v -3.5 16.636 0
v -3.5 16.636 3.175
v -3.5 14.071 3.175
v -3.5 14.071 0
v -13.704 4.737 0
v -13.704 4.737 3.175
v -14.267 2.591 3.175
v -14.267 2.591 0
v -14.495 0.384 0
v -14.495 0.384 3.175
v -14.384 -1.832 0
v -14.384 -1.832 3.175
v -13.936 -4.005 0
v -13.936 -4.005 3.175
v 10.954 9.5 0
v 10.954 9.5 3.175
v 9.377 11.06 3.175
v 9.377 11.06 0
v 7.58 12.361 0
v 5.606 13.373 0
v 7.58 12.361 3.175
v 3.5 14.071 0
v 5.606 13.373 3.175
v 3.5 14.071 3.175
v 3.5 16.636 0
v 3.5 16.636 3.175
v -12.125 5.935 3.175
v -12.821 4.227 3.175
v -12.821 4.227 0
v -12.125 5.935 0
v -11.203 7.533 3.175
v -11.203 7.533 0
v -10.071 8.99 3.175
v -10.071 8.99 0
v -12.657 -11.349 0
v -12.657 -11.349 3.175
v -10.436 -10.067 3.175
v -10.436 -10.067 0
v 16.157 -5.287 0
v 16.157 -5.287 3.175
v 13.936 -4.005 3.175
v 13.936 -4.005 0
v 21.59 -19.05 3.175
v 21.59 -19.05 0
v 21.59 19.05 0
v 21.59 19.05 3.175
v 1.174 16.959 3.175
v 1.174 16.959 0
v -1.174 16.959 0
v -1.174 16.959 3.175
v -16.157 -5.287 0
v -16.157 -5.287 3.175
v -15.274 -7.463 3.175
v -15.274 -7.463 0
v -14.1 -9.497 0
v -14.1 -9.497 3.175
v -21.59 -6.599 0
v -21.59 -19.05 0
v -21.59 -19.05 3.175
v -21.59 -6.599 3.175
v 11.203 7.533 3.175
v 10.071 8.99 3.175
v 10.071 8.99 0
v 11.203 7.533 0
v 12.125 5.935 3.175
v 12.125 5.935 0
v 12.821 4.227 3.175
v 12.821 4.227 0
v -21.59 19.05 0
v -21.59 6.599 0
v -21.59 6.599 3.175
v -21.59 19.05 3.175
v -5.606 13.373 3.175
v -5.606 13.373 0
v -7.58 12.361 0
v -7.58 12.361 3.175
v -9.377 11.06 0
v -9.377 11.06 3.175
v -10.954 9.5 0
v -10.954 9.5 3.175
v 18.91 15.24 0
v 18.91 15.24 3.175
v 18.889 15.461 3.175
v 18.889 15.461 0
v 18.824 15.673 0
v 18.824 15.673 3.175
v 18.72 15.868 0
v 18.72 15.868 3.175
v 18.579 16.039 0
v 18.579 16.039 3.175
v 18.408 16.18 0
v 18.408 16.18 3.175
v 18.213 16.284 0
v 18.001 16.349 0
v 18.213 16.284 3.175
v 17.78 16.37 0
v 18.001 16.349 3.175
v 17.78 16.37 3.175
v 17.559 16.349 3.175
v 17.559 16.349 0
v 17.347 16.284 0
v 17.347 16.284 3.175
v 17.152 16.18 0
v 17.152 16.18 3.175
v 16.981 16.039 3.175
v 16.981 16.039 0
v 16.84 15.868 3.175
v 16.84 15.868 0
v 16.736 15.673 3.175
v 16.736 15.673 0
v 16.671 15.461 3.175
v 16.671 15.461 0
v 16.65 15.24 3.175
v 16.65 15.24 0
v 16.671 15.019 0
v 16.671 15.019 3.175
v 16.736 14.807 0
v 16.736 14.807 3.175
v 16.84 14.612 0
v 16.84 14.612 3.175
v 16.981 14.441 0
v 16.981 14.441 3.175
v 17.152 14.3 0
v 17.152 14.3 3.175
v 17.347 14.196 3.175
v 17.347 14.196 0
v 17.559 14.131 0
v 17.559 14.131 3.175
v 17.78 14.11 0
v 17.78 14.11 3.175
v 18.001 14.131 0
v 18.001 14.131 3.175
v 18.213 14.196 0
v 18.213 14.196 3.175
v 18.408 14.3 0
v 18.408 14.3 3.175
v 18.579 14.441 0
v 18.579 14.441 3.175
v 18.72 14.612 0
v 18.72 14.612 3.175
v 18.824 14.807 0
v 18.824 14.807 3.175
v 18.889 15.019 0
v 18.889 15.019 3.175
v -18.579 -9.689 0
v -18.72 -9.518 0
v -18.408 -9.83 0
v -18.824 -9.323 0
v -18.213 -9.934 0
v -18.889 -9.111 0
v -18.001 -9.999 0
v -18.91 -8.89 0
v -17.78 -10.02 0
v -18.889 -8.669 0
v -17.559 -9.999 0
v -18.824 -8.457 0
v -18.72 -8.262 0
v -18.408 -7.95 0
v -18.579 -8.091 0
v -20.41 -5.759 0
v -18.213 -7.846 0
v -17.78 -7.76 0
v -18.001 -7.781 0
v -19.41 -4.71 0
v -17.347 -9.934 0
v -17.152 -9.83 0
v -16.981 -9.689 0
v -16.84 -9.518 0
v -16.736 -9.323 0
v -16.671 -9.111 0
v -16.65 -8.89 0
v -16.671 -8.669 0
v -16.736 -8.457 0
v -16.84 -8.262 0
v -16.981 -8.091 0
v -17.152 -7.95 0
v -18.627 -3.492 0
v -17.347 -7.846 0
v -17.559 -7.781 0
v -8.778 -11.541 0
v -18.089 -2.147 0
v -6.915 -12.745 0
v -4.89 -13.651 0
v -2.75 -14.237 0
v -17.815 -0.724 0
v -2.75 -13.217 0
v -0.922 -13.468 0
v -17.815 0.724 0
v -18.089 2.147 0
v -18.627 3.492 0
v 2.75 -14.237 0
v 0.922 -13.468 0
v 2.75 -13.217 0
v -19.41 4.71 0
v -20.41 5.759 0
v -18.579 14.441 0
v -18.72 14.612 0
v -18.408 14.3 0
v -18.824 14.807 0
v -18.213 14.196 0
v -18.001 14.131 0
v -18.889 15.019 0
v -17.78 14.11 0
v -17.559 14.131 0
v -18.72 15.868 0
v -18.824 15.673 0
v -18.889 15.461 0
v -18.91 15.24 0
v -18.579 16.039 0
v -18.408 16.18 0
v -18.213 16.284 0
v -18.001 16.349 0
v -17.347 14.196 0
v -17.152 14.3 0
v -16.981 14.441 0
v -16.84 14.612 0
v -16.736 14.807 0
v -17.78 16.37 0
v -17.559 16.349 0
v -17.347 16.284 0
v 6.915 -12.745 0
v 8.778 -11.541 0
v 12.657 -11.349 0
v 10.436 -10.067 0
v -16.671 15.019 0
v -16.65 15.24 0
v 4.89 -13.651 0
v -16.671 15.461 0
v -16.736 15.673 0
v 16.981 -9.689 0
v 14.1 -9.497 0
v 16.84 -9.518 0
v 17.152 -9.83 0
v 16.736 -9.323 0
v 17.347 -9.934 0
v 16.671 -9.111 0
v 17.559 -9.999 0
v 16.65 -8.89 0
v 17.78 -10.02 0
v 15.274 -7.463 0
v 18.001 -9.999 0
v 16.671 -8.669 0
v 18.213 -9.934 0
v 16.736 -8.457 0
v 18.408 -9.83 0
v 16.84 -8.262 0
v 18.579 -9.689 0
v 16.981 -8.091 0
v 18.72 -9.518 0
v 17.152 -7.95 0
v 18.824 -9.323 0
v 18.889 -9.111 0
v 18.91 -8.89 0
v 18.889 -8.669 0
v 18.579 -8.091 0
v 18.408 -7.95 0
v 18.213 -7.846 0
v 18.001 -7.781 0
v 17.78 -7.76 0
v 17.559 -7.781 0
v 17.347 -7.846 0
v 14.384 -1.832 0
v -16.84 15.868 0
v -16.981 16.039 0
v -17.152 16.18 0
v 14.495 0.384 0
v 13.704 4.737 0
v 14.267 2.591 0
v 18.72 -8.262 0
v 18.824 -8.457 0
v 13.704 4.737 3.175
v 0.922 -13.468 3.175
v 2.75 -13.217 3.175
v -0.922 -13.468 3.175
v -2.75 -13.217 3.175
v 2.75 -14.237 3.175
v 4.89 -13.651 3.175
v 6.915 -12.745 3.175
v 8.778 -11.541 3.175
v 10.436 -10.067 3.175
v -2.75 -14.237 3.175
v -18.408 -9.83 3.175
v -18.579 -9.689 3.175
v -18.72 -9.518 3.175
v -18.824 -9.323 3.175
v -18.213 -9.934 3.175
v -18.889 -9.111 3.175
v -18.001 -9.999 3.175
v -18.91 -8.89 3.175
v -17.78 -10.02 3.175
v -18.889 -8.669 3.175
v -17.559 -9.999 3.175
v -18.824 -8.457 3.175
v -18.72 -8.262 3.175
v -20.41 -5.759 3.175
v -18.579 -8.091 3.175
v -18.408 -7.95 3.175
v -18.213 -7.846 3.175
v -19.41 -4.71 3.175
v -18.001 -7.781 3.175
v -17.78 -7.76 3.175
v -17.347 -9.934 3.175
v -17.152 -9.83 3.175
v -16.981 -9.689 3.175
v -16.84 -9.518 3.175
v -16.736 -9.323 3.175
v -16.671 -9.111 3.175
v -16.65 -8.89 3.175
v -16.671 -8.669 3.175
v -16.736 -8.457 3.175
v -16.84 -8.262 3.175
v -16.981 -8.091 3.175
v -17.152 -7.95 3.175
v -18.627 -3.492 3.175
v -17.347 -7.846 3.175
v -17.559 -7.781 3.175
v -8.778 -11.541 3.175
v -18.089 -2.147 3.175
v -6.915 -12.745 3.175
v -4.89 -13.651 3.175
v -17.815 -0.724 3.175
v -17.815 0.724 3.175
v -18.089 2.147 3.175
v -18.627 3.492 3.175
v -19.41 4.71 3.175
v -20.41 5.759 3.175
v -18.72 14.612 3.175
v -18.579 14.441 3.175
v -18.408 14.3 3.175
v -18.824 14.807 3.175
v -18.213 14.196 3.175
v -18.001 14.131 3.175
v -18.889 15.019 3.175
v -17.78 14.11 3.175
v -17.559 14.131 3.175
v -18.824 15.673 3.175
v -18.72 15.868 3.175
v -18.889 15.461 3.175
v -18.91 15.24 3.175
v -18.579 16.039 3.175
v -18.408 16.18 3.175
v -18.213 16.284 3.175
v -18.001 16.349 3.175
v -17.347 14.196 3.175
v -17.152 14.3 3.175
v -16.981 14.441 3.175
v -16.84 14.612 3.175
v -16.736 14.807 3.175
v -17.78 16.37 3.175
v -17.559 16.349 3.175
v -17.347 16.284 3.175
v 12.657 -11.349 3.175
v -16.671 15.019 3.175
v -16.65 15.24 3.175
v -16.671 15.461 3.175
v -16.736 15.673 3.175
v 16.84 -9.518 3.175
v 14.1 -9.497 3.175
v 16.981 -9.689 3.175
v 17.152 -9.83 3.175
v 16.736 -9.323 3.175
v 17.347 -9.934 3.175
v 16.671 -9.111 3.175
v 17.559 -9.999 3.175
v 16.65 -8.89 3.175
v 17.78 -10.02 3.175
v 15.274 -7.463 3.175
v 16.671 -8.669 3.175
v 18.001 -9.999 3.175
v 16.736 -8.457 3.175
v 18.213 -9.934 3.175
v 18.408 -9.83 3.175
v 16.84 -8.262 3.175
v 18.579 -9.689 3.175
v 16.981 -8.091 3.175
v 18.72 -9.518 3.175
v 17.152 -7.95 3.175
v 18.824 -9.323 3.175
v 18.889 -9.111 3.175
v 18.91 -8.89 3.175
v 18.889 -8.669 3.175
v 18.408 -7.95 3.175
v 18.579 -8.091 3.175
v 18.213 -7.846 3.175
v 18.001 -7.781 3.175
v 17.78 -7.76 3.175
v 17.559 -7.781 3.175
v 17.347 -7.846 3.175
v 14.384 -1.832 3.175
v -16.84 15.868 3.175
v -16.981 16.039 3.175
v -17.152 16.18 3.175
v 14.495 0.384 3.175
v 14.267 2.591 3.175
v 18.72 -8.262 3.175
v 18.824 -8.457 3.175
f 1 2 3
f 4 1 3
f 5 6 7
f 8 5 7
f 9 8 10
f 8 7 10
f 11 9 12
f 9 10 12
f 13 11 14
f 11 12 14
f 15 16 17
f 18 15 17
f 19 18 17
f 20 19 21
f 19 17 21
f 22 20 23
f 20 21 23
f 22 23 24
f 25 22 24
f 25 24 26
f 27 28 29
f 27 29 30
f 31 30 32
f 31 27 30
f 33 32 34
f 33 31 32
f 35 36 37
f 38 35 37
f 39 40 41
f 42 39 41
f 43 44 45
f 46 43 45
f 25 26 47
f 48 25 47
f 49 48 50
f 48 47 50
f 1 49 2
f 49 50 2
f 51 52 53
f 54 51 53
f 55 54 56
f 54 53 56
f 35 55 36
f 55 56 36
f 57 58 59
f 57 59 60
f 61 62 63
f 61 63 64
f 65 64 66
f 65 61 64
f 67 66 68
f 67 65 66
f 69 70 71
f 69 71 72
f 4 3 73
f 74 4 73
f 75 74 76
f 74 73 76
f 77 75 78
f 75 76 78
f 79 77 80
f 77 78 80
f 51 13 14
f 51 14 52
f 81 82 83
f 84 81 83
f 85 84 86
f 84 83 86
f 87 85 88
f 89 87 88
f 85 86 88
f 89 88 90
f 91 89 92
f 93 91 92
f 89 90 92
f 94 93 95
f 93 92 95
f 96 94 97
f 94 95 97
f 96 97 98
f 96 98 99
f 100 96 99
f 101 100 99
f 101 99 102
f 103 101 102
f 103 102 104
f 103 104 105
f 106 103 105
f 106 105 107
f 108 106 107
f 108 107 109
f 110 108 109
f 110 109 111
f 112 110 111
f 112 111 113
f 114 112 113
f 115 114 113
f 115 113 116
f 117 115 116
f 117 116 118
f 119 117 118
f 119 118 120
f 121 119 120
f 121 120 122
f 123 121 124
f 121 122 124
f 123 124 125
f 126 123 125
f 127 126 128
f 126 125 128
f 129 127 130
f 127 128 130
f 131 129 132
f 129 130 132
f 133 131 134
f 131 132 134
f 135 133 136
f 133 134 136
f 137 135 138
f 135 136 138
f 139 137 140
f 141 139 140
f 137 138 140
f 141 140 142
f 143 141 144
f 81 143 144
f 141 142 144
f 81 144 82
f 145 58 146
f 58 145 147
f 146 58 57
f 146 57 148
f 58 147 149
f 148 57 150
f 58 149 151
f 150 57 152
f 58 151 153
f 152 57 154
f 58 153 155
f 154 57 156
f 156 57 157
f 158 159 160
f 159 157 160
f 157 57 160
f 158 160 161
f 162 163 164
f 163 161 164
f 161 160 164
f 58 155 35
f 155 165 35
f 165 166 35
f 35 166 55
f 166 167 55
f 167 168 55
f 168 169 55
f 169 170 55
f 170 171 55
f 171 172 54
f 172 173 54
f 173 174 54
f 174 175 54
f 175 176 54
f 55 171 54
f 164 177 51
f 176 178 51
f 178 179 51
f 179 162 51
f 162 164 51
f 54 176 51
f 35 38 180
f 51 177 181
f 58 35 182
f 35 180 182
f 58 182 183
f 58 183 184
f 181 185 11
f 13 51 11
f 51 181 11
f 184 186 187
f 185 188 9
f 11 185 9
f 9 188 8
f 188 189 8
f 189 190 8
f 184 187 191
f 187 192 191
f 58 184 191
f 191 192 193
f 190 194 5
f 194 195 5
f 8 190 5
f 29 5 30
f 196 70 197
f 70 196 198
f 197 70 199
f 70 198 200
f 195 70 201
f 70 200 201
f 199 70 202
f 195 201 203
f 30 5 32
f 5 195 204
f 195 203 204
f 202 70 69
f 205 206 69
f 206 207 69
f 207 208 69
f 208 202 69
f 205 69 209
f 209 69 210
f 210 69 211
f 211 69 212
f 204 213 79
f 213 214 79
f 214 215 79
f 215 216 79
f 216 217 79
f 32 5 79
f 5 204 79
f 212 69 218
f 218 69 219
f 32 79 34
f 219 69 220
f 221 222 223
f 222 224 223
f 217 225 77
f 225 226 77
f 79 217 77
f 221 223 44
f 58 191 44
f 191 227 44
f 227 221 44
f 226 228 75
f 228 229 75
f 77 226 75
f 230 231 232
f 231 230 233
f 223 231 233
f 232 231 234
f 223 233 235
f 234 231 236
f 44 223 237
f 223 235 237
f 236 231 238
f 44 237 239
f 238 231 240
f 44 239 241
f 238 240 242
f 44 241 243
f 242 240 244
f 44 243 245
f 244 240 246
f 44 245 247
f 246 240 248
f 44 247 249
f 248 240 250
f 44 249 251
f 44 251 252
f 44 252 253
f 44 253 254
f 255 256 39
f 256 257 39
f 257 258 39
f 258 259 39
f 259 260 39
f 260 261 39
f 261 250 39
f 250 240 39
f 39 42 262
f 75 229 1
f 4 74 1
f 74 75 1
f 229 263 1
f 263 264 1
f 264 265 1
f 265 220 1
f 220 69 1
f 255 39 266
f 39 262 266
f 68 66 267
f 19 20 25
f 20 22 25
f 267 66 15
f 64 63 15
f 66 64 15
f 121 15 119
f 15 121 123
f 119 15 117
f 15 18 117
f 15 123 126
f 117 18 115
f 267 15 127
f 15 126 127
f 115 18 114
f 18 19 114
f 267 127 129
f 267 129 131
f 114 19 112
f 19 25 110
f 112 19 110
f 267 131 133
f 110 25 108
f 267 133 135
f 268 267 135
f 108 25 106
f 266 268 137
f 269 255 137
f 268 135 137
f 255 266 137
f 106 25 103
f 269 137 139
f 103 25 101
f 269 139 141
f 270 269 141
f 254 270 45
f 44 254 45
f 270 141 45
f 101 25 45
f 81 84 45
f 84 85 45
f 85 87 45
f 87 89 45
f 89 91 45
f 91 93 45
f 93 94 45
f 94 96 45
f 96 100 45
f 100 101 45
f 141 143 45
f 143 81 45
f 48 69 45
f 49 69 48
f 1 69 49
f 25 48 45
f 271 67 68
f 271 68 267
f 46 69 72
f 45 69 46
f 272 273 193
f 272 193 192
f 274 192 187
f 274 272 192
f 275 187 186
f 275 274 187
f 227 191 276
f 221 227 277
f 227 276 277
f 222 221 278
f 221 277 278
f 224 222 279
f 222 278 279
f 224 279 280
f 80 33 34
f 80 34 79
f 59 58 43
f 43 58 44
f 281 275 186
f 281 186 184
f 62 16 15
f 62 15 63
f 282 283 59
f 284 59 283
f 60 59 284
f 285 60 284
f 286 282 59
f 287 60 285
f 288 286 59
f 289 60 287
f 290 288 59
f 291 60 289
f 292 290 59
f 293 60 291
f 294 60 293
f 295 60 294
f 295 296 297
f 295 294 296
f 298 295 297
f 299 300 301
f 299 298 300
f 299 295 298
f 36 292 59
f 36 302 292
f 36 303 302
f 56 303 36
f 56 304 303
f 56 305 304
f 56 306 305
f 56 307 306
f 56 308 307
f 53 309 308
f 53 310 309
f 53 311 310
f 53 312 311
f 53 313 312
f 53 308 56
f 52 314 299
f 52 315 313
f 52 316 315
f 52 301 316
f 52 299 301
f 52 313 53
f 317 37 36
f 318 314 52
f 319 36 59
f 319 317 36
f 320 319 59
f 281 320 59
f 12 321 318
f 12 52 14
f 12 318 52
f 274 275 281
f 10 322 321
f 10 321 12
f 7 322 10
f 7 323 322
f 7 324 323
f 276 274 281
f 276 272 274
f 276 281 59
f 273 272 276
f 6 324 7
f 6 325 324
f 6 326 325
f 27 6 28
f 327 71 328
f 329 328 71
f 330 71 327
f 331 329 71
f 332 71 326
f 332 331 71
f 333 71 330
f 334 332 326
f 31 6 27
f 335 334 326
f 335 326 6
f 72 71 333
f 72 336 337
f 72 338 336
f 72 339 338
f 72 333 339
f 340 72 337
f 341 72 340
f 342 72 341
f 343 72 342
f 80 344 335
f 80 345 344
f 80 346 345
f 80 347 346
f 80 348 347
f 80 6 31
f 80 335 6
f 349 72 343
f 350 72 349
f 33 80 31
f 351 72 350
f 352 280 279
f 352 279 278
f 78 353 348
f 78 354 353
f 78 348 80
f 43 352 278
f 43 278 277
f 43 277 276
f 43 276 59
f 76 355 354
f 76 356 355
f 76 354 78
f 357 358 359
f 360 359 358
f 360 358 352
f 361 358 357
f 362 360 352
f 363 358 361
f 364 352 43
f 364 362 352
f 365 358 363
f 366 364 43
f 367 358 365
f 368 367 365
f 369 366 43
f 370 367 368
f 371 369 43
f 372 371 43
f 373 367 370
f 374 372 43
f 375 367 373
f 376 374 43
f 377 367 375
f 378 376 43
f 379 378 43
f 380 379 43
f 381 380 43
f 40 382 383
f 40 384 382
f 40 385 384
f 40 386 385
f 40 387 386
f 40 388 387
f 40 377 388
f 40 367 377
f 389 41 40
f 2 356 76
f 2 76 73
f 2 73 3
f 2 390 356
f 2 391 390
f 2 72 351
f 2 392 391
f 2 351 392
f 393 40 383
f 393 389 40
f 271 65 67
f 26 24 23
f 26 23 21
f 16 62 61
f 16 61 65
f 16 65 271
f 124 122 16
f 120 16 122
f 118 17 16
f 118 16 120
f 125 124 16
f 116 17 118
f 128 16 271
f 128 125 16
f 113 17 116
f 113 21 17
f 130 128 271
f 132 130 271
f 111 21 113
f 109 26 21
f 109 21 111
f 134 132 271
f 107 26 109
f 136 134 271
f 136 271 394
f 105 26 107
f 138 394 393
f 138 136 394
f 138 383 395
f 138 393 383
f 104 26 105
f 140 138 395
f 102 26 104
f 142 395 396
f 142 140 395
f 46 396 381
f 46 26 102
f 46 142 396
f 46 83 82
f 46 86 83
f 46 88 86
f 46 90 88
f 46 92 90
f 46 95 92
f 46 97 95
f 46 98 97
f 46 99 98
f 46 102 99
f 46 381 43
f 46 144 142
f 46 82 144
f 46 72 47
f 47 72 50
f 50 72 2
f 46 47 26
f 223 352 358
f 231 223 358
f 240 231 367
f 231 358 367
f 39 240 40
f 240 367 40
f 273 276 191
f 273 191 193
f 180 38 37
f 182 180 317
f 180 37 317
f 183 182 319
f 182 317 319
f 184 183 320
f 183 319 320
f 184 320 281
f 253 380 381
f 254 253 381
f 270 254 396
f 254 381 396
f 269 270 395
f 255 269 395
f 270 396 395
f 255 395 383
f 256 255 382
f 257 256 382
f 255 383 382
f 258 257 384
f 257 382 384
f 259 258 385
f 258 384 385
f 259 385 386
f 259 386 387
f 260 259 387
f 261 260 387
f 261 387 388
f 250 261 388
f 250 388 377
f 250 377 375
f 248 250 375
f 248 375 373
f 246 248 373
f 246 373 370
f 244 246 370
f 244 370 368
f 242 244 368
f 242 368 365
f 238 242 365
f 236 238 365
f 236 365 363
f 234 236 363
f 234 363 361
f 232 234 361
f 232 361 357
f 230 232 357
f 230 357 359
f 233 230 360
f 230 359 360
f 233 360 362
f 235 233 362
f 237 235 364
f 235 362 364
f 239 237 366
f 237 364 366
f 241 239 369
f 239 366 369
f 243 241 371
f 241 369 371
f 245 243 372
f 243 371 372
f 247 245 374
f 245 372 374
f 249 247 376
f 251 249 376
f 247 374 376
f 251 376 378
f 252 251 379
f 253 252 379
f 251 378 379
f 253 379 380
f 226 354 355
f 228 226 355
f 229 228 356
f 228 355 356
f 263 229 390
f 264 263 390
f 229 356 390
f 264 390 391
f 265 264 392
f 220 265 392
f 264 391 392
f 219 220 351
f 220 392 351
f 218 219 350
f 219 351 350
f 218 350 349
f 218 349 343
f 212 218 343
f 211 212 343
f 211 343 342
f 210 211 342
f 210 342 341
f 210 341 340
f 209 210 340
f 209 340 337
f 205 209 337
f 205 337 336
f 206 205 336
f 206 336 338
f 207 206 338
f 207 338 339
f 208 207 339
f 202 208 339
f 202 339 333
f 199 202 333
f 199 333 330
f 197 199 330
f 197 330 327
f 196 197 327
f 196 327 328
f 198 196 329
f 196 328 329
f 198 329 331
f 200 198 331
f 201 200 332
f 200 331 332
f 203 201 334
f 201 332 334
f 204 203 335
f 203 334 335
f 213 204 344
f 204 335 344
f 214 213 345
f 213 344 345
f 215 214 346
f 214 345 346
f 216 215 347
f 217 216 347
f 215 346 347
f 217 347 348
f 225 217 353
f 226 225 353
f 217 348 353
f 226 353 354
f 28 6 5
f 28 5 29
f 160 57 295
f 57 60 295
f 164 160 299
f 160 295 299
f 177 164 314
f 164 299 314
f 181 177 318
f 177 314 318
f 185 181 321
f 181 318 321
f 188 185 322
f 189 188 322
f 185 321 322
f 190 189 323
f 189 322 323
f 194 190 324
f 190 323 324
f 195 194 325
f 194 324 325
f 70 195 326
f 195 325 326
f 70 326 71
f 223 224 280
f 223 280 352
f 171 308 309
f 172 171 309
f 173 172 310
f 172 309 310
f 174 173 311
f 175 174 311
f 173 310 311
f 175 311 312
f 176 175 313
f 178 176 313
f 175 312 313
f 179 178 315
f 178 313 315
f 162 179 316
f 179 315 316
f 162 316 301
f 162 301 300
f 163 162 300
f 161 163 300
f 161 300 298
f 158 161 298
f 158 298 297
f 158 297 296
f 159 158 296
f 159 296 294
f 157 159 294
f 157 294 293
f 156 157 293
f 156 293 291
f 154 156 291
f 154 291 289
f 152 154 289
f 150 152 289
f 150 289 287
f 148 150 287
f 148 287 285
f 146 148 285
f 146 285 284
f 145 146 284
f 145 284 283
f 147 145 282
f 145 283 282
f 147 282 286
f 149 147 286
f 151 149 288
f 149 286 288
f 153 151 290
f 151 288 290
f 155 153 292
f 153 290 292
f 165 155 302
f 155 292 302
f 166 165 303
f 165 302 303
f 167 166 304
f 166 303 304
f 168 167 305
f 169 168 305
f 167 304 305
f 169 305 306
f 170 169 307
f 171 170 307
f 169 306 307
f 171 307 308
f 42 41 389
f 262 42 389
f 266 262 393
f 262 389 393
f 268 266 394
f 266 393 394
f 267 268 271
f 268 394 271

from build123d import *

# Parameters (mm, degrees)
SKETCH1_W             = 43.18
SKETCH1_H             = 38.1
BOSS_EXTRUDE1_DEPTH   = 3.175
SKETCH2_R             = 14.5
CUT_EXTRUDE1_DEPTH    = 4.175
CUT_EXTRUDE2_DEPTH    = 4.175
CIRPATTERN1_COUNT     = 3
BOSS_EXTRUDE2_DEPTH   = 3.175
CIRPATTERN2_COUNT     = 3
SKETCH6_R             = 7.62
CUT_EXTRUDE4_DEPTH    = 4.175
F_4_40_TAPPED_HOLE1_D = 2.2606


with BuildPart() as part:
    # Sketch1 → Boss-Extrude1 (new body)
    with BuildSketch(Plane.XY):
        Rectangle(SKETCH1_W, SKETCH1_H)
    extrude(amount=BOSS_EXTRUDE1_DEPTH)

    # Sketch2 → Cut-Extrude1 (cut, through all)
    with BuildSketch(Plane.XY.offset(3.175)):
        Circle(SKETCH2_R)
    extrude(amount=-CUT_EXTRUDE1_DEPTH, mode=Mode.SUBTRACT)

    # Sketch3 → Cut-Extrude2 (cut, through all)
    with BuildSketch(Plane.XY.offset(3.175)):
        with BuildLine():
            Line((-3.5, 16.63580476), (-3.5, 14.071247279))
            ThreePointArc((-3.5, 14.071247279), (0, 14.5), (3.5, 14.071247279))
            Line((3.5, 14.071247279), (3.5, 16.63580476))
            ThreePointArc((3.5, 16.63580476), (0, 17), (-3.5, 16.63580476))
        make_face()
    cut_extrude2 = extrude(amount=-CUT_EXTRUDE2_DEPTH, mode=Mode.SUBTRACT)

    # CirPattern1: Cut-Extrude2 ×3 about axis
    cirpattern1_axis = Axis((0, 0, 0), (0, 0, 1))
    for i in range(1, CIRPATTERN1_COUNT):
        add(cut_extrude2.rotate(cirpattern1_axis, i * 360 / CIRPATTERN1_COUNT), mode=Mode.SUBTRACT)

    # Sketch4 → Boss-Extrude2 (add)
    with BuildSketch(Plane.XY.offset(3.175)):
        with BuildLine():
            Line((-2.75, -13.216939888), (-2.75, -14.236836025))
            ThreePointArc((-2.75, -14.236836025), (0, -14.5), (2.75, -14.236836025))
            Line((2.75, -14.236836025), (2.75, -13.216939888))
            ThreePointArc((2.75, -13.216939888), (0, -13.5), (-2.75, -13.216939888))
        make_face()
    boss_extrude2 = extrude(amount=-BOSS_EXTRUDE2_DEPTH)

    # CirPattern2: Boss-Extrude2 ×3 about axis
    cirpattern2_axis = Axis((0, 0, 0), (0, 0, 1))
    for i in range(1, CIRPATTERN2_COUNT):
        add(boss_extrude2.rotate(cirpattern2_axis, i * 360 / CIRPATTERN2_COUNT))

    # Sketch6 → Cut-Extrude4 (cut, through all)
    with BuildSketch(Plane.XY.offset(3.175)):
        with Locations((-25.4, 0)):
            Circle(SKETCH6_R)
    extrude(amount=-CUT_EXTRUDE4_DEPTH, mode=Mode.SUBTRACT)

    # #4-40 Tapped Hole1 (through all)
    with Locations(Plane(origin=(0, 0, 0), x_dir=(-1, 0, 0), z_dir=(0, 0, -1))):
        with Locations((-17.78, 15.24), (-17.78, -8.89), (17.78, -8.89), (17.78, 15.24)):
            Hole(F_4_40_TAPPED_HOLE1_D / 2)


solid = part.part
